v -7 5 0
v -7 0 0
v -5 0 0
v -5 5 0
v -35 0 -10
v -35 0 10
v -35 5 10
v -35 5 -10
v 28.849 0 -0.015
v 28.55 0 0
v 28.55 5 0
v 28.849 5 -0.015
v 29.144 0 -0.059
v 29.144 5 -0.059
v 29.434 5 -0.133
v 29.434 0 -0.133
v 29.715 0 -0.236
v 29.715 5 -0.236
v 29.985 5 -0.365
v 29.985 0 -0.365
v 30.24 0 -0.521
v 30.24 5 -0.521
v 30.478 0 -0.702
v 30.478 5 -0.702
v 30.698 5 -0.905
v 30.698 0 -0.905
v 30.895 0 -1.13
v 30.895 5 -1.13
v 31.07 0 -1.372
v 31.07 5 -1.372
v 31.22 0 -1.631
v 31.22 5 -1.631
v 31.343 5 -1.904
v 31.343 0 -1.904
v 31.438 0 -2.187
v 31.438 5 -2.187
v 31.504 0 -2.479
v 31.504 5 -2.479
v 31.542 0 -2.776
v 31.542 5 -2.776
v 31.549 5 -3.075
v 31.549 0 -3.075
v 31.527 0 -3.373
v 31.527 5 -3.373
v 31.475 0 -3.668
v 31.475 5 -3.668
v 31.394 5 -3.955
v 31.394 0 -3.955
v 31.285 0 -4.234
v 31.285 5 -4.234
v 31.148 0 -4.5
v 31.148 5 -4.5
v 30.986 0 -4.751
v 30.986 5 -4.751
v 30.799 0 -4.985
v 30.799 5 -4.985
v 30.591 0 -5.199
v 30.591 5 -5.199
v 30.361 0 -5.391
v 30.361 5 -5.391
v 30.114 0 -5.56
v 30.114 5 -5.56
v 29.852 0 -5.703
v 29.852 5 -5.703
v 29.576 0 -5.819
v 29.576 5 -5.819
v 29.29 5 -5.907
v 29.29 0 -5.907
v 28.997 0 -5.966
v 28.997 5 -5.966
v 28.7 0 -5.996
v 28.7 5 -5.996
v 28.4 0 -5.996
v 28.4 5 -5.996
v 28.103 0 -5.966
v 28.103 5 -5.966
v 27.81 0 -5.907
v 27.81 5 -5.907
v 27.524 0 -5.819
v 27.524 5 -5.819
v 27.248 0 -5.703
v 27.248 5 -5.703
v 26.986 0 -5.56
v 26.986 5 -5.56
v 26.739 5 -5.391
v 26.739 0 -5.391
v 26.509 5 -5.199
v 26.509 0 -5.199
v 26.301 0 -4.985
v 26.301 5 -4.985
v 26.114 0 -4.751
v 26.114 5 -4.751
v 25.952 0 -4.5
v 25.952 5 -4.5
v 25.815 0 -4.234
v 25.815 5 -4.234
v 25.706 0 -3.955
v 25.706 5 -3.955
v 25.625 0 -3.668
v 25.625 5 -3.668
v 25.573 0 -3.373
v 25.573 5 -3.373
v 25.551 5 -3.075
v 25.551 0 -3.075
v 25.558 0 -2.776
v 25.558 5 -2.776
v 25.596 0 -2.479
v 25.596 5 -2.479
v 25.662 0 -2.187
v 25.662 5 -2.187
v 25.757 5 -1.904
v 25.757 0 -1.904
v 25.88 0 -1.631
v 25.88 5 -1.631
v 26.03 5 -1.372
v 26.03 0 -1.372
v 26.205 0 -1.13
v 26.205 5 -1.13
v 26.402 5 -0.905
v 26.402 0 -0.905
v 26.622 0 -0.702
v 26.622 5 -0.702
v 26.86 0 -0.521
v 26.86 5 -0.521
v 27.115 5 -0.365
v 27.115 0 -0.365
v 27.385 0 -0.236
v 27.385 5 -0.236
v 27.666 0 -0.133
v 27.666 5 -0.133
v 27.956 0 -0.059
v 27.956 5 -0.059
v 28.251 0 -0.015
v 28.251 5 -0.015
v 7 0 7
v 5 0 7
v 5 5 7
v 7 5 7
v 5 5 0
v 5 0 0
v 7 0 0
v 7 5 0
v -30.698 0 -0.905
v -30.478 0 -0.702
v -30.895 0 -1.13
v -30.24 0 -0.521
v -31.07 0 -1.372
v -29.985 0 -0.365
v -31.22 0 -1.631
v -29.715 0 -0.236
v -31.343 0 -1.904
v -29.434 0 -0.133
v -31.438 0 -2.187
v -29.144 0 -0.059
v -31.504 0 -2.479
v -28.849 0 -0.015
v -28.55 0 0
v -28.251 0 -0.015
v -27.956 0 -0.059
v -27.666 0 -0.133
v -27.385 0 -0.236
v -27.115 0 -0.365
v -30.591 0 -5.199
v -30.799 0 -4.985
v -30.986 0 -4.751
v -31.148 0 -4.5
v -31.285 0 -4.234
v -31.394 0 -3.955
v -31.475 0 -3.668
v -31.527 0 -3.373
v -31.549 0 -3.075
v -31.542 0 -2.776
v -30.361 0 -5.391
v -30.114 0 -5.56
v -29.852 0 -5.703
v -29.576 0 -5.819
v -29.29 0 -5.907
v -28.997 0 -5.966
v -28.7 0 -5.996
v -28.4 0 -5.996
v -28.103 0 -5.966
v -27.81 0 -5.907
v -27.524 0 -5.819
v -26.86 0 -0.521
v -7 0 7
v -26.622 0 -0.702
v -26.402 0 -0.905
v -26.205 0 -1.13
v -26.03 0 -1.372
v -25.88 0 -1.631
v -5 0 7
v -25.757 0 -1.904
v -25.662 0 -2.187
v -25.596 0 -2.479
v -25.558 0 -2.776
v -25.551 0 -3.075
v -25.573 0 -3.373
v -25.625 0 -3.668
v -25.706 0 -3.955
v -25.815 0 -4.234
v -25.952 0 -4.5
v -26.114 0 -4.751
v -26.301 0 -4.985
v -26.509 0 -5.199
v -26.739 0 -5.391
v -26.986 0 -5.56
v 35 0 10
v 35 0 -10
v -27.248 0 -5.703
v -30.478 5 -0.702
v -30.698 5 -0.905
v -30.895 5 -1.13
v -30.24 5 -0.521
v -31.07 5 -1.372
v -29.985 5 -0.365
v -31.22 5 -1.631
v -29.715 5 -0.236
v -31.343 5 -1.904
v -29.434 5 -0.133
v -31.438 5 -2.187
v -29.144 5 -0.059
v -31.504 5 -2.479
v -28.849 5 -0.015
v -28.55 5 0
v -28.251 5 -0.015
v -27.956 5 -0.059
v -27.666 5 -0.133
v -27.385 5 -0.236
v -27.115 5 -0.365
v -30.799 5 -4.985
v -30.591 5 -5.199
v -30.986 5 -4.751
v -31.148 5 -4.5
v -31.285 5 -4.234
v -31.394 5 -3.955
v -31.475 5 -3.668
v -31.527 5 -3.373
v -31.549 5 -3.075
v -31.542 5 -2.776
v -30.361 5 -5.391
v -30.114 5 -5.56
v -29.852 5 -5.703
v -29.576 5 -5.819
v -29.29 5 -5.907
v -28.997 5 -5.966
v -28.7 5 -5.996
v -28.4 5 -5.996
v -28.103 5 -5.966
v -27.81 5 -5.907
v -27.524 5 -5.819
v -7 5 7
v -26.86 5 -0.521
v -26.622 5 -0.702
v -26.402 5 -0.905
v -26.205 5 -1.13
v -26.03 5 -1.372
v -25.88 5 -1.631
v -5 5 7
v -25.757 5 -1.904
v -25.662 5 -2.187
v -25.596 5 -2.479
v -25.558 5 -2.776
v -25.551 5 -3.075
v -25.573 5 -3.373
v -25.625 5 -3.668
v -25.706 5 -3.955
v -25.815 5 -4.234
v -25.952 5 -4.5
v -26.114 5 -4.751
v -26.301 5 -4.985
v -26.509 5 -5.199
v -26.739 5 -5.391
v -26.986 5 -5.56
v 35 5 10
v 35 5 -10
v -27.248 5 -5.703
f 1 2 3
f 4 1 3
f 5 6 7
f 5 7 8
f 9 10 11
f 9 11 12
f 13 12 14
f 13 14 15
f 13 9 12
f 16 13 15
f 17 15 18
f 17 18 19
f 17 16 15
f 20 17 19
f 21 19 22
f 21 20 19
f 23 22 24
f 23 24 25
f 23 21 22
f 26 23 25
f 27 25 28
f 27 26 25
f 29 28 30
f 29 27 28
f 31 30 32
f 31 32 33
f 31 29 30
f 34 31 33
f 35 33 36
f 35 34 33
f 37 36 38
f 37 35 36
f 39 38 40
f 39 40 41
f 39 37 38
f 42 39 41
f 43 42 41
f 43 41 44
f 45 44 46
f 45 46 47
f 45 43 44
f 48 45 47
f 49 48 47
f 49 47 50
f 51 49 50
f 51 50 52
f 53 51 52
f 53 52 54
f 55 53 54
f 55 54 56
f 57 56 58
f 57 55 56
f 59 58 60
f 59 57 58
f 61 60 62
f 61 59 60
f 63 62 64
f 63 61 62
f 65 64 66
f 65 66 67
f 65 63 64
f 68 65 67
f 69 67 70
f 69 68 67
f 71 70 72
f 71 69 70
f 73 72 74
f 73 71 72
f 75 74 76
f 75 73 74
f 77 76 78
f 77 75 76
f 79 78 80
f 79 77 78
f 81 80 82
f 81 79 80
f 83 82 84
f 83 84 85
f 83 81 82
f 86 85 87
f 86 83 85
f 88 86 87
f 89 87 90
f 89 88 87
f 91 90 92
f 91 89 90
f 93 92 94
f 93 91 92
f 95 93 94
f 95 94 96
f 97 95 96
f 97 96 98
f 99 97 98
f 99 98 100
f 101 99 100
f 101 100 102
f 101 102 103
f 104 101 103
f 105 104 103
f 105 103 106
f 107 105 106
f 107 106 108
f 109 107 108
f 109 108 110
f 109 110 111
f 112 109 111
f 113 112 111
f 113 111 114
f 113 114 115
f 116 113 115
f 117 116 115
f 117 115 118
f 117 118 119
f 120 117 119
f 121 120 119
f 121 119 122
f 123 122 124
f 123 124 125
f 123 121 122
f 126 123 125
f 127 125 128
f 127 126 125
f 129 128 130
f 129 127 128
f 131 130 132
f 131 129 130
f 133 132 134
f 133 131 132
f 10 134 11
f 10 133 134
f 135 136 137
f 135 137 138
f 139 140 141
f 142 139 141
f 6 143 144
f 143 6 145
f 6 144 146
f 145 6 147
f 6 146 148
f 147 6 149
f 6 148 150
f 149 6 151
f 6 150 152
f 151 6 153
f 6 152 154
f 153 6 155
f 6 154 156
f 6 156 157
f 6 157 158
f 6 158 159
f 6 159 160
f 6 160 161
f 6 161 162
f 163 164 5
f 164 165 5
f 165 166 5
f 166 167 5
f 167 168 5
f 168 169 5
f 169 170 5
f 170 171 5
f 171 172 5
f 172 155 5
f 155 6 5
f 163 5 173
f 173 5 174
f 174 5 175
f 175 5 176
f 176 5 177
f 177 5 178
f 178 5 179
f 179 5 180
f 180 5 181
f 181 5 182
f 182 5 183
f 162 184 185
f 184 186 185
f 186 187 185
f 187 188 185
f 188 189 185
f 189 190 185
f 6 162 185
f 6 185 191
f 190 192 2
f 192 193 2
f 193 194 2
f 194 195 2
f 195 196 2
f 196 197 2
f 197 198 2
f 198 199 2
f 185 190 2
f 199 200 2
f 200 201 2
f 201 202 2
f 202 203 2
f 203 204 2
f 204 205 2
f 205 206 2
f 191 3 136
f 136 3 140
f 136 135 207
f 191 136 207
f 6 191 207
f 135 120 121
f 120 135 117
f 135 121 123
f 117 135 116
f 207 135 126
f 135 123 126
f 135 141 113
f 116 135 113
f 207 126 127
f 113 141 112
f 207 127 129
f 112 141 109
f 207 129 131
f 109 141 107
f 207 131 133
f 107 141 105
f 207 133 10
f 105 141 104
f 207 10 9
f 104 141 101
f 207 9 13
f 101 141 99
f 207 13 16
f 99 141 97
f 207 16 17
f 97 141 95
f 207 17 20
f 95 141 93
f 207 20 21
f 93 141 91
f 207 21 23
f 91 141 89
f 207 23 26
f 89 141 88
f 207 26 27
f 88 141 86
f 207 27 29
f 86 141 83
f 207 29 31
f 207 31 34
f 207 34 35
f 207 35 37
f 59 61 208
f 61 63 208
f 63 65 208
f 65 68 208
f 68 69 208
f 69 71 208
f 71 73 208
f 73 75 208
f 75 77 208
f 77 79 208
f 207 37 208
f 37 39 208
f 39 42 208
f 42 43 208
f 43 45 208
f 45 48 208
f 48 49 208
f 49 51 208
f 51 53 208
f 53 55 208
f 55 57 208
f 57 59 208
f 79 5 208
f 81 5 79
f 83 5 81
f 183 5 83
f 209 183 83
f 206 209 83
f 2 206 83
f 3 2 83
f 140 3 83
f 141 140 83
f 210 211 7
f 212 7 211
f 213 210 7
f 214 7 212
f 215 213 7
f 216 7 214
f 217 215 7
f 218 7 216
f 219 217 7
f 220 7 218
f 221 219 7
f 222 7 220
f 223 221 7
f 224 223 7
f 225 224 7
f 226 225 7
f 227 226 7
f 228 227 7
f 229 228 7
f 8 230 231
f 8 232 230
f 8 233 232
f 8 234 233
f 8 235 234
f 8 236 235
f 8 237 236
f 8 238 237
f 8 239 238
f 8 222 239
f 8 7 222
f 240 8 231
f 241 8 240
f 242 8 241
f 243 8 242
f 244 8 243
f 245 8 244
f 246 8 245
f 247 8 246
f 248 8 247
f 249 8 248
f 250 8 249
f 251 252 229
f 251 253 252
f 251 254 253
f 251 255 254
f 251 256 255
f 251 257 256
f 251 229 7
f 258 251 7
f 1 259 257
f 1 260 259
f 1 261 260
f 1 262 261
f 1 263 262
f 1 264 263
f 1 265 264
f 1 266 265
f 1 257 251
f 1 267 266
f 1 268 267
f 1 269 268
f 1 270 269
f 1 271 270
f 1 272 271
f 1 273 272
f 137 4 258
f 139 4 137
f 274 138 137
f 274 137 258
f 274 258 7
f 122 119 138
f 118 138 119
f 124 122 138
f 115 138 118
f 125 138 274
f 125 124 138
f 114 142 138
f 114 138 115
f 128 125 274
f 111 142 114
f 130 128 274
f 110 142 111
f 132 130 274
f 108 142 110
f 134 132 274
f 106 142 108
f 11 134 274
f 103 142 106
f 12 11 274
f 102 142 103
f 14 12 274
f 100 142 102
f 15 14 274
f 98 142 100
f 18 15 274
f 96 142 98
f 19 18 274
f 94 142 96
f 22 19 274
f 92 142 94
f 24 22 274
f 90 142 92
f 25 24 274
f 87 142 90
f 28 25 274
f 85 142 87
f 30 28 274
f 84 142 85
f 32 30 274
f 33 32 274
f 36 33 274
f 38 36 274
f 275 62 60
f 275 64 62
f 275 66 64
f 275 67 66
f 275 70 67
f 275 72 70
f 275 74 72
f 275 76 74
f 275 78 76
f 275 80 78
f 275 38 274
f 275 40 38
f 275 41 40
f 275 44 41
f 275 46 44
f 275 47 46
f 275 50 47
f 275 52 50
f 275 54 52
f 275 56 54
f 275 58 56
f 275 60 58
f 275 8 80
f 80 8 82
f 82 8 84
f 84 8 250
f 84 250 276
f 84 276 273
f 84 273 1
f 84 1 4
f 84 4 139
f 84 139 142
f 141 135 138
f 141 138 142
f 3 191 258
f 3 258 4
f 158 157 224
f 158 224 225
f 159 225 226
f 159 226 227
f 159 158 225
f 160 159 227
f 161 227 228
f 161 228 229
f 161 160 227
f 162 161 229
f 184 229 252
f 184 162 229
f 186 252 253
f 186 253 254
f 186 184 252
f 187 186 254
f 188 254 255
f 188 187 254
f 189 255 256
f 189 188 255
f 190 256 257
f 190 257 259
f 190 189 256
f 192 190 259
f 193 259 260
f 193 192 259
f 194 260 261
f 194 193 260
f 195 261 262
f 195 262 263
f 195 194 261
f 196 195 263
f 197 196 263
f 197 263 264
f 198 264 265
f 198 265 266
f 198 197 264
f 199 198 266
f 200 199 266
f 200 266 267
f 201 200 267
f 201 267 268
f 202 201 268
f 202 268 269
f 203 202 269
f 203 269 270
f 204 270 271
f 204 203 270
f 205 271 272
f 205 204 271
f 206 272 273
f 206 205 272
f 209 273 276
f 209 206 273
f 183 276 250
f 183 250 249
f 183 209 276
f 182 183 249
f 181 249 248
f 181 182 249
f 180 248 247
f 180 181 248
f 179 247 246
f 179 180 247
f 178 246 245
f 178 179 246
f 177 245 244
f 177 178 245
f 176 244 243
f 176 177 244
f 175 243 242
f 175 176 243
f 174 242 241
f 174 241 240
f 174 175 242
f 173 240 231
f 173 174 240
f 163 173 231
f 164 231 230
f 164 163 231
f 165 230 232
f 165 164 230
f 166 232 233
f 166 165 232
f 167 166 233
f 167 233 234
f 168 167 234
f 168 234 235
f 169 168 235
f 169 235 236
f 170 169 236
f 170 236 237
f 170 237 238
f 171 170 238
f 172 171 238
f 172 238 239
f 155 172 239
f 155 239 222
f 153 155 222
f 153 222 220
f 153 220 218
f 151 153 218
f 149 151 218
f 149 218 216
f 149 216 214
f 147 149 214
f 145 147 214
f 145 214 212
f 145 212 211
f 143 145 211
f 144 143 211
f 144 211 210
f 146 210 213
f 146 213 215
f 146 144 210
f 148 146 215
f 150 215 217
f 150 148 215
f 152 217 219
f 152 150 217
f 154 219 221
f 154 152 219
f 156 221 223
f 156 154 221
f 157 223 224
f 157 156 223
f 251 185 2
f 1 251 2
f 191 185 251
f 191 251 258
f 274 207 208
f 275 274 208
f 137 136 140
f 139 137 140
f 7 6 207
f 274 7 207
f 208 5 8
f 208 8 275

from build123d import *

# Parameters (mm, degrees)
SKETCH_1_W      = 70
SKETCH_1_H      = 20
SKETCH_1_R      = 3
SKETCH_1_W_2    = 2
SKETCH_1_H_2    = 7
EXTRUDE_1_DEPTH = 5


with BuildPart() as part:
    # 草图1 → 凸台-拉伸1 (new body)
    with BuildSketch(Plane(origin=(0, 0, 0), x_dir=(1, 0, 0), z_dir=(0, 1, 0))):
        Rectangle(SKETCH_1_W, SKETCH_1_H)
        with Locations(Location((-28.55, 3, 0), (0, 0, 270))):
            Circle(SKETCH_1_R, mode=Mode.SUBTRACT)
        with Locations(Location((28.55, 3, 0), (0, 0, 270))):
            Circle(SKETCH_1_R, mode=Mode.SUBTRACT)
        with Locations((-6, -3.5)):
            Rectangle(SKETCH_1_W_2, SKETCH_1_H_2, mode=Mode.SUBTRACT)
        with Locations((6, -3.5)):
            Rectangle(SKETCH_1_W_2, SKETCH_1_H_2, mode=Mode.SUBTRACT)
    extrude(amount=EXTRUDE_1_DEPTH)


solid = part.part
